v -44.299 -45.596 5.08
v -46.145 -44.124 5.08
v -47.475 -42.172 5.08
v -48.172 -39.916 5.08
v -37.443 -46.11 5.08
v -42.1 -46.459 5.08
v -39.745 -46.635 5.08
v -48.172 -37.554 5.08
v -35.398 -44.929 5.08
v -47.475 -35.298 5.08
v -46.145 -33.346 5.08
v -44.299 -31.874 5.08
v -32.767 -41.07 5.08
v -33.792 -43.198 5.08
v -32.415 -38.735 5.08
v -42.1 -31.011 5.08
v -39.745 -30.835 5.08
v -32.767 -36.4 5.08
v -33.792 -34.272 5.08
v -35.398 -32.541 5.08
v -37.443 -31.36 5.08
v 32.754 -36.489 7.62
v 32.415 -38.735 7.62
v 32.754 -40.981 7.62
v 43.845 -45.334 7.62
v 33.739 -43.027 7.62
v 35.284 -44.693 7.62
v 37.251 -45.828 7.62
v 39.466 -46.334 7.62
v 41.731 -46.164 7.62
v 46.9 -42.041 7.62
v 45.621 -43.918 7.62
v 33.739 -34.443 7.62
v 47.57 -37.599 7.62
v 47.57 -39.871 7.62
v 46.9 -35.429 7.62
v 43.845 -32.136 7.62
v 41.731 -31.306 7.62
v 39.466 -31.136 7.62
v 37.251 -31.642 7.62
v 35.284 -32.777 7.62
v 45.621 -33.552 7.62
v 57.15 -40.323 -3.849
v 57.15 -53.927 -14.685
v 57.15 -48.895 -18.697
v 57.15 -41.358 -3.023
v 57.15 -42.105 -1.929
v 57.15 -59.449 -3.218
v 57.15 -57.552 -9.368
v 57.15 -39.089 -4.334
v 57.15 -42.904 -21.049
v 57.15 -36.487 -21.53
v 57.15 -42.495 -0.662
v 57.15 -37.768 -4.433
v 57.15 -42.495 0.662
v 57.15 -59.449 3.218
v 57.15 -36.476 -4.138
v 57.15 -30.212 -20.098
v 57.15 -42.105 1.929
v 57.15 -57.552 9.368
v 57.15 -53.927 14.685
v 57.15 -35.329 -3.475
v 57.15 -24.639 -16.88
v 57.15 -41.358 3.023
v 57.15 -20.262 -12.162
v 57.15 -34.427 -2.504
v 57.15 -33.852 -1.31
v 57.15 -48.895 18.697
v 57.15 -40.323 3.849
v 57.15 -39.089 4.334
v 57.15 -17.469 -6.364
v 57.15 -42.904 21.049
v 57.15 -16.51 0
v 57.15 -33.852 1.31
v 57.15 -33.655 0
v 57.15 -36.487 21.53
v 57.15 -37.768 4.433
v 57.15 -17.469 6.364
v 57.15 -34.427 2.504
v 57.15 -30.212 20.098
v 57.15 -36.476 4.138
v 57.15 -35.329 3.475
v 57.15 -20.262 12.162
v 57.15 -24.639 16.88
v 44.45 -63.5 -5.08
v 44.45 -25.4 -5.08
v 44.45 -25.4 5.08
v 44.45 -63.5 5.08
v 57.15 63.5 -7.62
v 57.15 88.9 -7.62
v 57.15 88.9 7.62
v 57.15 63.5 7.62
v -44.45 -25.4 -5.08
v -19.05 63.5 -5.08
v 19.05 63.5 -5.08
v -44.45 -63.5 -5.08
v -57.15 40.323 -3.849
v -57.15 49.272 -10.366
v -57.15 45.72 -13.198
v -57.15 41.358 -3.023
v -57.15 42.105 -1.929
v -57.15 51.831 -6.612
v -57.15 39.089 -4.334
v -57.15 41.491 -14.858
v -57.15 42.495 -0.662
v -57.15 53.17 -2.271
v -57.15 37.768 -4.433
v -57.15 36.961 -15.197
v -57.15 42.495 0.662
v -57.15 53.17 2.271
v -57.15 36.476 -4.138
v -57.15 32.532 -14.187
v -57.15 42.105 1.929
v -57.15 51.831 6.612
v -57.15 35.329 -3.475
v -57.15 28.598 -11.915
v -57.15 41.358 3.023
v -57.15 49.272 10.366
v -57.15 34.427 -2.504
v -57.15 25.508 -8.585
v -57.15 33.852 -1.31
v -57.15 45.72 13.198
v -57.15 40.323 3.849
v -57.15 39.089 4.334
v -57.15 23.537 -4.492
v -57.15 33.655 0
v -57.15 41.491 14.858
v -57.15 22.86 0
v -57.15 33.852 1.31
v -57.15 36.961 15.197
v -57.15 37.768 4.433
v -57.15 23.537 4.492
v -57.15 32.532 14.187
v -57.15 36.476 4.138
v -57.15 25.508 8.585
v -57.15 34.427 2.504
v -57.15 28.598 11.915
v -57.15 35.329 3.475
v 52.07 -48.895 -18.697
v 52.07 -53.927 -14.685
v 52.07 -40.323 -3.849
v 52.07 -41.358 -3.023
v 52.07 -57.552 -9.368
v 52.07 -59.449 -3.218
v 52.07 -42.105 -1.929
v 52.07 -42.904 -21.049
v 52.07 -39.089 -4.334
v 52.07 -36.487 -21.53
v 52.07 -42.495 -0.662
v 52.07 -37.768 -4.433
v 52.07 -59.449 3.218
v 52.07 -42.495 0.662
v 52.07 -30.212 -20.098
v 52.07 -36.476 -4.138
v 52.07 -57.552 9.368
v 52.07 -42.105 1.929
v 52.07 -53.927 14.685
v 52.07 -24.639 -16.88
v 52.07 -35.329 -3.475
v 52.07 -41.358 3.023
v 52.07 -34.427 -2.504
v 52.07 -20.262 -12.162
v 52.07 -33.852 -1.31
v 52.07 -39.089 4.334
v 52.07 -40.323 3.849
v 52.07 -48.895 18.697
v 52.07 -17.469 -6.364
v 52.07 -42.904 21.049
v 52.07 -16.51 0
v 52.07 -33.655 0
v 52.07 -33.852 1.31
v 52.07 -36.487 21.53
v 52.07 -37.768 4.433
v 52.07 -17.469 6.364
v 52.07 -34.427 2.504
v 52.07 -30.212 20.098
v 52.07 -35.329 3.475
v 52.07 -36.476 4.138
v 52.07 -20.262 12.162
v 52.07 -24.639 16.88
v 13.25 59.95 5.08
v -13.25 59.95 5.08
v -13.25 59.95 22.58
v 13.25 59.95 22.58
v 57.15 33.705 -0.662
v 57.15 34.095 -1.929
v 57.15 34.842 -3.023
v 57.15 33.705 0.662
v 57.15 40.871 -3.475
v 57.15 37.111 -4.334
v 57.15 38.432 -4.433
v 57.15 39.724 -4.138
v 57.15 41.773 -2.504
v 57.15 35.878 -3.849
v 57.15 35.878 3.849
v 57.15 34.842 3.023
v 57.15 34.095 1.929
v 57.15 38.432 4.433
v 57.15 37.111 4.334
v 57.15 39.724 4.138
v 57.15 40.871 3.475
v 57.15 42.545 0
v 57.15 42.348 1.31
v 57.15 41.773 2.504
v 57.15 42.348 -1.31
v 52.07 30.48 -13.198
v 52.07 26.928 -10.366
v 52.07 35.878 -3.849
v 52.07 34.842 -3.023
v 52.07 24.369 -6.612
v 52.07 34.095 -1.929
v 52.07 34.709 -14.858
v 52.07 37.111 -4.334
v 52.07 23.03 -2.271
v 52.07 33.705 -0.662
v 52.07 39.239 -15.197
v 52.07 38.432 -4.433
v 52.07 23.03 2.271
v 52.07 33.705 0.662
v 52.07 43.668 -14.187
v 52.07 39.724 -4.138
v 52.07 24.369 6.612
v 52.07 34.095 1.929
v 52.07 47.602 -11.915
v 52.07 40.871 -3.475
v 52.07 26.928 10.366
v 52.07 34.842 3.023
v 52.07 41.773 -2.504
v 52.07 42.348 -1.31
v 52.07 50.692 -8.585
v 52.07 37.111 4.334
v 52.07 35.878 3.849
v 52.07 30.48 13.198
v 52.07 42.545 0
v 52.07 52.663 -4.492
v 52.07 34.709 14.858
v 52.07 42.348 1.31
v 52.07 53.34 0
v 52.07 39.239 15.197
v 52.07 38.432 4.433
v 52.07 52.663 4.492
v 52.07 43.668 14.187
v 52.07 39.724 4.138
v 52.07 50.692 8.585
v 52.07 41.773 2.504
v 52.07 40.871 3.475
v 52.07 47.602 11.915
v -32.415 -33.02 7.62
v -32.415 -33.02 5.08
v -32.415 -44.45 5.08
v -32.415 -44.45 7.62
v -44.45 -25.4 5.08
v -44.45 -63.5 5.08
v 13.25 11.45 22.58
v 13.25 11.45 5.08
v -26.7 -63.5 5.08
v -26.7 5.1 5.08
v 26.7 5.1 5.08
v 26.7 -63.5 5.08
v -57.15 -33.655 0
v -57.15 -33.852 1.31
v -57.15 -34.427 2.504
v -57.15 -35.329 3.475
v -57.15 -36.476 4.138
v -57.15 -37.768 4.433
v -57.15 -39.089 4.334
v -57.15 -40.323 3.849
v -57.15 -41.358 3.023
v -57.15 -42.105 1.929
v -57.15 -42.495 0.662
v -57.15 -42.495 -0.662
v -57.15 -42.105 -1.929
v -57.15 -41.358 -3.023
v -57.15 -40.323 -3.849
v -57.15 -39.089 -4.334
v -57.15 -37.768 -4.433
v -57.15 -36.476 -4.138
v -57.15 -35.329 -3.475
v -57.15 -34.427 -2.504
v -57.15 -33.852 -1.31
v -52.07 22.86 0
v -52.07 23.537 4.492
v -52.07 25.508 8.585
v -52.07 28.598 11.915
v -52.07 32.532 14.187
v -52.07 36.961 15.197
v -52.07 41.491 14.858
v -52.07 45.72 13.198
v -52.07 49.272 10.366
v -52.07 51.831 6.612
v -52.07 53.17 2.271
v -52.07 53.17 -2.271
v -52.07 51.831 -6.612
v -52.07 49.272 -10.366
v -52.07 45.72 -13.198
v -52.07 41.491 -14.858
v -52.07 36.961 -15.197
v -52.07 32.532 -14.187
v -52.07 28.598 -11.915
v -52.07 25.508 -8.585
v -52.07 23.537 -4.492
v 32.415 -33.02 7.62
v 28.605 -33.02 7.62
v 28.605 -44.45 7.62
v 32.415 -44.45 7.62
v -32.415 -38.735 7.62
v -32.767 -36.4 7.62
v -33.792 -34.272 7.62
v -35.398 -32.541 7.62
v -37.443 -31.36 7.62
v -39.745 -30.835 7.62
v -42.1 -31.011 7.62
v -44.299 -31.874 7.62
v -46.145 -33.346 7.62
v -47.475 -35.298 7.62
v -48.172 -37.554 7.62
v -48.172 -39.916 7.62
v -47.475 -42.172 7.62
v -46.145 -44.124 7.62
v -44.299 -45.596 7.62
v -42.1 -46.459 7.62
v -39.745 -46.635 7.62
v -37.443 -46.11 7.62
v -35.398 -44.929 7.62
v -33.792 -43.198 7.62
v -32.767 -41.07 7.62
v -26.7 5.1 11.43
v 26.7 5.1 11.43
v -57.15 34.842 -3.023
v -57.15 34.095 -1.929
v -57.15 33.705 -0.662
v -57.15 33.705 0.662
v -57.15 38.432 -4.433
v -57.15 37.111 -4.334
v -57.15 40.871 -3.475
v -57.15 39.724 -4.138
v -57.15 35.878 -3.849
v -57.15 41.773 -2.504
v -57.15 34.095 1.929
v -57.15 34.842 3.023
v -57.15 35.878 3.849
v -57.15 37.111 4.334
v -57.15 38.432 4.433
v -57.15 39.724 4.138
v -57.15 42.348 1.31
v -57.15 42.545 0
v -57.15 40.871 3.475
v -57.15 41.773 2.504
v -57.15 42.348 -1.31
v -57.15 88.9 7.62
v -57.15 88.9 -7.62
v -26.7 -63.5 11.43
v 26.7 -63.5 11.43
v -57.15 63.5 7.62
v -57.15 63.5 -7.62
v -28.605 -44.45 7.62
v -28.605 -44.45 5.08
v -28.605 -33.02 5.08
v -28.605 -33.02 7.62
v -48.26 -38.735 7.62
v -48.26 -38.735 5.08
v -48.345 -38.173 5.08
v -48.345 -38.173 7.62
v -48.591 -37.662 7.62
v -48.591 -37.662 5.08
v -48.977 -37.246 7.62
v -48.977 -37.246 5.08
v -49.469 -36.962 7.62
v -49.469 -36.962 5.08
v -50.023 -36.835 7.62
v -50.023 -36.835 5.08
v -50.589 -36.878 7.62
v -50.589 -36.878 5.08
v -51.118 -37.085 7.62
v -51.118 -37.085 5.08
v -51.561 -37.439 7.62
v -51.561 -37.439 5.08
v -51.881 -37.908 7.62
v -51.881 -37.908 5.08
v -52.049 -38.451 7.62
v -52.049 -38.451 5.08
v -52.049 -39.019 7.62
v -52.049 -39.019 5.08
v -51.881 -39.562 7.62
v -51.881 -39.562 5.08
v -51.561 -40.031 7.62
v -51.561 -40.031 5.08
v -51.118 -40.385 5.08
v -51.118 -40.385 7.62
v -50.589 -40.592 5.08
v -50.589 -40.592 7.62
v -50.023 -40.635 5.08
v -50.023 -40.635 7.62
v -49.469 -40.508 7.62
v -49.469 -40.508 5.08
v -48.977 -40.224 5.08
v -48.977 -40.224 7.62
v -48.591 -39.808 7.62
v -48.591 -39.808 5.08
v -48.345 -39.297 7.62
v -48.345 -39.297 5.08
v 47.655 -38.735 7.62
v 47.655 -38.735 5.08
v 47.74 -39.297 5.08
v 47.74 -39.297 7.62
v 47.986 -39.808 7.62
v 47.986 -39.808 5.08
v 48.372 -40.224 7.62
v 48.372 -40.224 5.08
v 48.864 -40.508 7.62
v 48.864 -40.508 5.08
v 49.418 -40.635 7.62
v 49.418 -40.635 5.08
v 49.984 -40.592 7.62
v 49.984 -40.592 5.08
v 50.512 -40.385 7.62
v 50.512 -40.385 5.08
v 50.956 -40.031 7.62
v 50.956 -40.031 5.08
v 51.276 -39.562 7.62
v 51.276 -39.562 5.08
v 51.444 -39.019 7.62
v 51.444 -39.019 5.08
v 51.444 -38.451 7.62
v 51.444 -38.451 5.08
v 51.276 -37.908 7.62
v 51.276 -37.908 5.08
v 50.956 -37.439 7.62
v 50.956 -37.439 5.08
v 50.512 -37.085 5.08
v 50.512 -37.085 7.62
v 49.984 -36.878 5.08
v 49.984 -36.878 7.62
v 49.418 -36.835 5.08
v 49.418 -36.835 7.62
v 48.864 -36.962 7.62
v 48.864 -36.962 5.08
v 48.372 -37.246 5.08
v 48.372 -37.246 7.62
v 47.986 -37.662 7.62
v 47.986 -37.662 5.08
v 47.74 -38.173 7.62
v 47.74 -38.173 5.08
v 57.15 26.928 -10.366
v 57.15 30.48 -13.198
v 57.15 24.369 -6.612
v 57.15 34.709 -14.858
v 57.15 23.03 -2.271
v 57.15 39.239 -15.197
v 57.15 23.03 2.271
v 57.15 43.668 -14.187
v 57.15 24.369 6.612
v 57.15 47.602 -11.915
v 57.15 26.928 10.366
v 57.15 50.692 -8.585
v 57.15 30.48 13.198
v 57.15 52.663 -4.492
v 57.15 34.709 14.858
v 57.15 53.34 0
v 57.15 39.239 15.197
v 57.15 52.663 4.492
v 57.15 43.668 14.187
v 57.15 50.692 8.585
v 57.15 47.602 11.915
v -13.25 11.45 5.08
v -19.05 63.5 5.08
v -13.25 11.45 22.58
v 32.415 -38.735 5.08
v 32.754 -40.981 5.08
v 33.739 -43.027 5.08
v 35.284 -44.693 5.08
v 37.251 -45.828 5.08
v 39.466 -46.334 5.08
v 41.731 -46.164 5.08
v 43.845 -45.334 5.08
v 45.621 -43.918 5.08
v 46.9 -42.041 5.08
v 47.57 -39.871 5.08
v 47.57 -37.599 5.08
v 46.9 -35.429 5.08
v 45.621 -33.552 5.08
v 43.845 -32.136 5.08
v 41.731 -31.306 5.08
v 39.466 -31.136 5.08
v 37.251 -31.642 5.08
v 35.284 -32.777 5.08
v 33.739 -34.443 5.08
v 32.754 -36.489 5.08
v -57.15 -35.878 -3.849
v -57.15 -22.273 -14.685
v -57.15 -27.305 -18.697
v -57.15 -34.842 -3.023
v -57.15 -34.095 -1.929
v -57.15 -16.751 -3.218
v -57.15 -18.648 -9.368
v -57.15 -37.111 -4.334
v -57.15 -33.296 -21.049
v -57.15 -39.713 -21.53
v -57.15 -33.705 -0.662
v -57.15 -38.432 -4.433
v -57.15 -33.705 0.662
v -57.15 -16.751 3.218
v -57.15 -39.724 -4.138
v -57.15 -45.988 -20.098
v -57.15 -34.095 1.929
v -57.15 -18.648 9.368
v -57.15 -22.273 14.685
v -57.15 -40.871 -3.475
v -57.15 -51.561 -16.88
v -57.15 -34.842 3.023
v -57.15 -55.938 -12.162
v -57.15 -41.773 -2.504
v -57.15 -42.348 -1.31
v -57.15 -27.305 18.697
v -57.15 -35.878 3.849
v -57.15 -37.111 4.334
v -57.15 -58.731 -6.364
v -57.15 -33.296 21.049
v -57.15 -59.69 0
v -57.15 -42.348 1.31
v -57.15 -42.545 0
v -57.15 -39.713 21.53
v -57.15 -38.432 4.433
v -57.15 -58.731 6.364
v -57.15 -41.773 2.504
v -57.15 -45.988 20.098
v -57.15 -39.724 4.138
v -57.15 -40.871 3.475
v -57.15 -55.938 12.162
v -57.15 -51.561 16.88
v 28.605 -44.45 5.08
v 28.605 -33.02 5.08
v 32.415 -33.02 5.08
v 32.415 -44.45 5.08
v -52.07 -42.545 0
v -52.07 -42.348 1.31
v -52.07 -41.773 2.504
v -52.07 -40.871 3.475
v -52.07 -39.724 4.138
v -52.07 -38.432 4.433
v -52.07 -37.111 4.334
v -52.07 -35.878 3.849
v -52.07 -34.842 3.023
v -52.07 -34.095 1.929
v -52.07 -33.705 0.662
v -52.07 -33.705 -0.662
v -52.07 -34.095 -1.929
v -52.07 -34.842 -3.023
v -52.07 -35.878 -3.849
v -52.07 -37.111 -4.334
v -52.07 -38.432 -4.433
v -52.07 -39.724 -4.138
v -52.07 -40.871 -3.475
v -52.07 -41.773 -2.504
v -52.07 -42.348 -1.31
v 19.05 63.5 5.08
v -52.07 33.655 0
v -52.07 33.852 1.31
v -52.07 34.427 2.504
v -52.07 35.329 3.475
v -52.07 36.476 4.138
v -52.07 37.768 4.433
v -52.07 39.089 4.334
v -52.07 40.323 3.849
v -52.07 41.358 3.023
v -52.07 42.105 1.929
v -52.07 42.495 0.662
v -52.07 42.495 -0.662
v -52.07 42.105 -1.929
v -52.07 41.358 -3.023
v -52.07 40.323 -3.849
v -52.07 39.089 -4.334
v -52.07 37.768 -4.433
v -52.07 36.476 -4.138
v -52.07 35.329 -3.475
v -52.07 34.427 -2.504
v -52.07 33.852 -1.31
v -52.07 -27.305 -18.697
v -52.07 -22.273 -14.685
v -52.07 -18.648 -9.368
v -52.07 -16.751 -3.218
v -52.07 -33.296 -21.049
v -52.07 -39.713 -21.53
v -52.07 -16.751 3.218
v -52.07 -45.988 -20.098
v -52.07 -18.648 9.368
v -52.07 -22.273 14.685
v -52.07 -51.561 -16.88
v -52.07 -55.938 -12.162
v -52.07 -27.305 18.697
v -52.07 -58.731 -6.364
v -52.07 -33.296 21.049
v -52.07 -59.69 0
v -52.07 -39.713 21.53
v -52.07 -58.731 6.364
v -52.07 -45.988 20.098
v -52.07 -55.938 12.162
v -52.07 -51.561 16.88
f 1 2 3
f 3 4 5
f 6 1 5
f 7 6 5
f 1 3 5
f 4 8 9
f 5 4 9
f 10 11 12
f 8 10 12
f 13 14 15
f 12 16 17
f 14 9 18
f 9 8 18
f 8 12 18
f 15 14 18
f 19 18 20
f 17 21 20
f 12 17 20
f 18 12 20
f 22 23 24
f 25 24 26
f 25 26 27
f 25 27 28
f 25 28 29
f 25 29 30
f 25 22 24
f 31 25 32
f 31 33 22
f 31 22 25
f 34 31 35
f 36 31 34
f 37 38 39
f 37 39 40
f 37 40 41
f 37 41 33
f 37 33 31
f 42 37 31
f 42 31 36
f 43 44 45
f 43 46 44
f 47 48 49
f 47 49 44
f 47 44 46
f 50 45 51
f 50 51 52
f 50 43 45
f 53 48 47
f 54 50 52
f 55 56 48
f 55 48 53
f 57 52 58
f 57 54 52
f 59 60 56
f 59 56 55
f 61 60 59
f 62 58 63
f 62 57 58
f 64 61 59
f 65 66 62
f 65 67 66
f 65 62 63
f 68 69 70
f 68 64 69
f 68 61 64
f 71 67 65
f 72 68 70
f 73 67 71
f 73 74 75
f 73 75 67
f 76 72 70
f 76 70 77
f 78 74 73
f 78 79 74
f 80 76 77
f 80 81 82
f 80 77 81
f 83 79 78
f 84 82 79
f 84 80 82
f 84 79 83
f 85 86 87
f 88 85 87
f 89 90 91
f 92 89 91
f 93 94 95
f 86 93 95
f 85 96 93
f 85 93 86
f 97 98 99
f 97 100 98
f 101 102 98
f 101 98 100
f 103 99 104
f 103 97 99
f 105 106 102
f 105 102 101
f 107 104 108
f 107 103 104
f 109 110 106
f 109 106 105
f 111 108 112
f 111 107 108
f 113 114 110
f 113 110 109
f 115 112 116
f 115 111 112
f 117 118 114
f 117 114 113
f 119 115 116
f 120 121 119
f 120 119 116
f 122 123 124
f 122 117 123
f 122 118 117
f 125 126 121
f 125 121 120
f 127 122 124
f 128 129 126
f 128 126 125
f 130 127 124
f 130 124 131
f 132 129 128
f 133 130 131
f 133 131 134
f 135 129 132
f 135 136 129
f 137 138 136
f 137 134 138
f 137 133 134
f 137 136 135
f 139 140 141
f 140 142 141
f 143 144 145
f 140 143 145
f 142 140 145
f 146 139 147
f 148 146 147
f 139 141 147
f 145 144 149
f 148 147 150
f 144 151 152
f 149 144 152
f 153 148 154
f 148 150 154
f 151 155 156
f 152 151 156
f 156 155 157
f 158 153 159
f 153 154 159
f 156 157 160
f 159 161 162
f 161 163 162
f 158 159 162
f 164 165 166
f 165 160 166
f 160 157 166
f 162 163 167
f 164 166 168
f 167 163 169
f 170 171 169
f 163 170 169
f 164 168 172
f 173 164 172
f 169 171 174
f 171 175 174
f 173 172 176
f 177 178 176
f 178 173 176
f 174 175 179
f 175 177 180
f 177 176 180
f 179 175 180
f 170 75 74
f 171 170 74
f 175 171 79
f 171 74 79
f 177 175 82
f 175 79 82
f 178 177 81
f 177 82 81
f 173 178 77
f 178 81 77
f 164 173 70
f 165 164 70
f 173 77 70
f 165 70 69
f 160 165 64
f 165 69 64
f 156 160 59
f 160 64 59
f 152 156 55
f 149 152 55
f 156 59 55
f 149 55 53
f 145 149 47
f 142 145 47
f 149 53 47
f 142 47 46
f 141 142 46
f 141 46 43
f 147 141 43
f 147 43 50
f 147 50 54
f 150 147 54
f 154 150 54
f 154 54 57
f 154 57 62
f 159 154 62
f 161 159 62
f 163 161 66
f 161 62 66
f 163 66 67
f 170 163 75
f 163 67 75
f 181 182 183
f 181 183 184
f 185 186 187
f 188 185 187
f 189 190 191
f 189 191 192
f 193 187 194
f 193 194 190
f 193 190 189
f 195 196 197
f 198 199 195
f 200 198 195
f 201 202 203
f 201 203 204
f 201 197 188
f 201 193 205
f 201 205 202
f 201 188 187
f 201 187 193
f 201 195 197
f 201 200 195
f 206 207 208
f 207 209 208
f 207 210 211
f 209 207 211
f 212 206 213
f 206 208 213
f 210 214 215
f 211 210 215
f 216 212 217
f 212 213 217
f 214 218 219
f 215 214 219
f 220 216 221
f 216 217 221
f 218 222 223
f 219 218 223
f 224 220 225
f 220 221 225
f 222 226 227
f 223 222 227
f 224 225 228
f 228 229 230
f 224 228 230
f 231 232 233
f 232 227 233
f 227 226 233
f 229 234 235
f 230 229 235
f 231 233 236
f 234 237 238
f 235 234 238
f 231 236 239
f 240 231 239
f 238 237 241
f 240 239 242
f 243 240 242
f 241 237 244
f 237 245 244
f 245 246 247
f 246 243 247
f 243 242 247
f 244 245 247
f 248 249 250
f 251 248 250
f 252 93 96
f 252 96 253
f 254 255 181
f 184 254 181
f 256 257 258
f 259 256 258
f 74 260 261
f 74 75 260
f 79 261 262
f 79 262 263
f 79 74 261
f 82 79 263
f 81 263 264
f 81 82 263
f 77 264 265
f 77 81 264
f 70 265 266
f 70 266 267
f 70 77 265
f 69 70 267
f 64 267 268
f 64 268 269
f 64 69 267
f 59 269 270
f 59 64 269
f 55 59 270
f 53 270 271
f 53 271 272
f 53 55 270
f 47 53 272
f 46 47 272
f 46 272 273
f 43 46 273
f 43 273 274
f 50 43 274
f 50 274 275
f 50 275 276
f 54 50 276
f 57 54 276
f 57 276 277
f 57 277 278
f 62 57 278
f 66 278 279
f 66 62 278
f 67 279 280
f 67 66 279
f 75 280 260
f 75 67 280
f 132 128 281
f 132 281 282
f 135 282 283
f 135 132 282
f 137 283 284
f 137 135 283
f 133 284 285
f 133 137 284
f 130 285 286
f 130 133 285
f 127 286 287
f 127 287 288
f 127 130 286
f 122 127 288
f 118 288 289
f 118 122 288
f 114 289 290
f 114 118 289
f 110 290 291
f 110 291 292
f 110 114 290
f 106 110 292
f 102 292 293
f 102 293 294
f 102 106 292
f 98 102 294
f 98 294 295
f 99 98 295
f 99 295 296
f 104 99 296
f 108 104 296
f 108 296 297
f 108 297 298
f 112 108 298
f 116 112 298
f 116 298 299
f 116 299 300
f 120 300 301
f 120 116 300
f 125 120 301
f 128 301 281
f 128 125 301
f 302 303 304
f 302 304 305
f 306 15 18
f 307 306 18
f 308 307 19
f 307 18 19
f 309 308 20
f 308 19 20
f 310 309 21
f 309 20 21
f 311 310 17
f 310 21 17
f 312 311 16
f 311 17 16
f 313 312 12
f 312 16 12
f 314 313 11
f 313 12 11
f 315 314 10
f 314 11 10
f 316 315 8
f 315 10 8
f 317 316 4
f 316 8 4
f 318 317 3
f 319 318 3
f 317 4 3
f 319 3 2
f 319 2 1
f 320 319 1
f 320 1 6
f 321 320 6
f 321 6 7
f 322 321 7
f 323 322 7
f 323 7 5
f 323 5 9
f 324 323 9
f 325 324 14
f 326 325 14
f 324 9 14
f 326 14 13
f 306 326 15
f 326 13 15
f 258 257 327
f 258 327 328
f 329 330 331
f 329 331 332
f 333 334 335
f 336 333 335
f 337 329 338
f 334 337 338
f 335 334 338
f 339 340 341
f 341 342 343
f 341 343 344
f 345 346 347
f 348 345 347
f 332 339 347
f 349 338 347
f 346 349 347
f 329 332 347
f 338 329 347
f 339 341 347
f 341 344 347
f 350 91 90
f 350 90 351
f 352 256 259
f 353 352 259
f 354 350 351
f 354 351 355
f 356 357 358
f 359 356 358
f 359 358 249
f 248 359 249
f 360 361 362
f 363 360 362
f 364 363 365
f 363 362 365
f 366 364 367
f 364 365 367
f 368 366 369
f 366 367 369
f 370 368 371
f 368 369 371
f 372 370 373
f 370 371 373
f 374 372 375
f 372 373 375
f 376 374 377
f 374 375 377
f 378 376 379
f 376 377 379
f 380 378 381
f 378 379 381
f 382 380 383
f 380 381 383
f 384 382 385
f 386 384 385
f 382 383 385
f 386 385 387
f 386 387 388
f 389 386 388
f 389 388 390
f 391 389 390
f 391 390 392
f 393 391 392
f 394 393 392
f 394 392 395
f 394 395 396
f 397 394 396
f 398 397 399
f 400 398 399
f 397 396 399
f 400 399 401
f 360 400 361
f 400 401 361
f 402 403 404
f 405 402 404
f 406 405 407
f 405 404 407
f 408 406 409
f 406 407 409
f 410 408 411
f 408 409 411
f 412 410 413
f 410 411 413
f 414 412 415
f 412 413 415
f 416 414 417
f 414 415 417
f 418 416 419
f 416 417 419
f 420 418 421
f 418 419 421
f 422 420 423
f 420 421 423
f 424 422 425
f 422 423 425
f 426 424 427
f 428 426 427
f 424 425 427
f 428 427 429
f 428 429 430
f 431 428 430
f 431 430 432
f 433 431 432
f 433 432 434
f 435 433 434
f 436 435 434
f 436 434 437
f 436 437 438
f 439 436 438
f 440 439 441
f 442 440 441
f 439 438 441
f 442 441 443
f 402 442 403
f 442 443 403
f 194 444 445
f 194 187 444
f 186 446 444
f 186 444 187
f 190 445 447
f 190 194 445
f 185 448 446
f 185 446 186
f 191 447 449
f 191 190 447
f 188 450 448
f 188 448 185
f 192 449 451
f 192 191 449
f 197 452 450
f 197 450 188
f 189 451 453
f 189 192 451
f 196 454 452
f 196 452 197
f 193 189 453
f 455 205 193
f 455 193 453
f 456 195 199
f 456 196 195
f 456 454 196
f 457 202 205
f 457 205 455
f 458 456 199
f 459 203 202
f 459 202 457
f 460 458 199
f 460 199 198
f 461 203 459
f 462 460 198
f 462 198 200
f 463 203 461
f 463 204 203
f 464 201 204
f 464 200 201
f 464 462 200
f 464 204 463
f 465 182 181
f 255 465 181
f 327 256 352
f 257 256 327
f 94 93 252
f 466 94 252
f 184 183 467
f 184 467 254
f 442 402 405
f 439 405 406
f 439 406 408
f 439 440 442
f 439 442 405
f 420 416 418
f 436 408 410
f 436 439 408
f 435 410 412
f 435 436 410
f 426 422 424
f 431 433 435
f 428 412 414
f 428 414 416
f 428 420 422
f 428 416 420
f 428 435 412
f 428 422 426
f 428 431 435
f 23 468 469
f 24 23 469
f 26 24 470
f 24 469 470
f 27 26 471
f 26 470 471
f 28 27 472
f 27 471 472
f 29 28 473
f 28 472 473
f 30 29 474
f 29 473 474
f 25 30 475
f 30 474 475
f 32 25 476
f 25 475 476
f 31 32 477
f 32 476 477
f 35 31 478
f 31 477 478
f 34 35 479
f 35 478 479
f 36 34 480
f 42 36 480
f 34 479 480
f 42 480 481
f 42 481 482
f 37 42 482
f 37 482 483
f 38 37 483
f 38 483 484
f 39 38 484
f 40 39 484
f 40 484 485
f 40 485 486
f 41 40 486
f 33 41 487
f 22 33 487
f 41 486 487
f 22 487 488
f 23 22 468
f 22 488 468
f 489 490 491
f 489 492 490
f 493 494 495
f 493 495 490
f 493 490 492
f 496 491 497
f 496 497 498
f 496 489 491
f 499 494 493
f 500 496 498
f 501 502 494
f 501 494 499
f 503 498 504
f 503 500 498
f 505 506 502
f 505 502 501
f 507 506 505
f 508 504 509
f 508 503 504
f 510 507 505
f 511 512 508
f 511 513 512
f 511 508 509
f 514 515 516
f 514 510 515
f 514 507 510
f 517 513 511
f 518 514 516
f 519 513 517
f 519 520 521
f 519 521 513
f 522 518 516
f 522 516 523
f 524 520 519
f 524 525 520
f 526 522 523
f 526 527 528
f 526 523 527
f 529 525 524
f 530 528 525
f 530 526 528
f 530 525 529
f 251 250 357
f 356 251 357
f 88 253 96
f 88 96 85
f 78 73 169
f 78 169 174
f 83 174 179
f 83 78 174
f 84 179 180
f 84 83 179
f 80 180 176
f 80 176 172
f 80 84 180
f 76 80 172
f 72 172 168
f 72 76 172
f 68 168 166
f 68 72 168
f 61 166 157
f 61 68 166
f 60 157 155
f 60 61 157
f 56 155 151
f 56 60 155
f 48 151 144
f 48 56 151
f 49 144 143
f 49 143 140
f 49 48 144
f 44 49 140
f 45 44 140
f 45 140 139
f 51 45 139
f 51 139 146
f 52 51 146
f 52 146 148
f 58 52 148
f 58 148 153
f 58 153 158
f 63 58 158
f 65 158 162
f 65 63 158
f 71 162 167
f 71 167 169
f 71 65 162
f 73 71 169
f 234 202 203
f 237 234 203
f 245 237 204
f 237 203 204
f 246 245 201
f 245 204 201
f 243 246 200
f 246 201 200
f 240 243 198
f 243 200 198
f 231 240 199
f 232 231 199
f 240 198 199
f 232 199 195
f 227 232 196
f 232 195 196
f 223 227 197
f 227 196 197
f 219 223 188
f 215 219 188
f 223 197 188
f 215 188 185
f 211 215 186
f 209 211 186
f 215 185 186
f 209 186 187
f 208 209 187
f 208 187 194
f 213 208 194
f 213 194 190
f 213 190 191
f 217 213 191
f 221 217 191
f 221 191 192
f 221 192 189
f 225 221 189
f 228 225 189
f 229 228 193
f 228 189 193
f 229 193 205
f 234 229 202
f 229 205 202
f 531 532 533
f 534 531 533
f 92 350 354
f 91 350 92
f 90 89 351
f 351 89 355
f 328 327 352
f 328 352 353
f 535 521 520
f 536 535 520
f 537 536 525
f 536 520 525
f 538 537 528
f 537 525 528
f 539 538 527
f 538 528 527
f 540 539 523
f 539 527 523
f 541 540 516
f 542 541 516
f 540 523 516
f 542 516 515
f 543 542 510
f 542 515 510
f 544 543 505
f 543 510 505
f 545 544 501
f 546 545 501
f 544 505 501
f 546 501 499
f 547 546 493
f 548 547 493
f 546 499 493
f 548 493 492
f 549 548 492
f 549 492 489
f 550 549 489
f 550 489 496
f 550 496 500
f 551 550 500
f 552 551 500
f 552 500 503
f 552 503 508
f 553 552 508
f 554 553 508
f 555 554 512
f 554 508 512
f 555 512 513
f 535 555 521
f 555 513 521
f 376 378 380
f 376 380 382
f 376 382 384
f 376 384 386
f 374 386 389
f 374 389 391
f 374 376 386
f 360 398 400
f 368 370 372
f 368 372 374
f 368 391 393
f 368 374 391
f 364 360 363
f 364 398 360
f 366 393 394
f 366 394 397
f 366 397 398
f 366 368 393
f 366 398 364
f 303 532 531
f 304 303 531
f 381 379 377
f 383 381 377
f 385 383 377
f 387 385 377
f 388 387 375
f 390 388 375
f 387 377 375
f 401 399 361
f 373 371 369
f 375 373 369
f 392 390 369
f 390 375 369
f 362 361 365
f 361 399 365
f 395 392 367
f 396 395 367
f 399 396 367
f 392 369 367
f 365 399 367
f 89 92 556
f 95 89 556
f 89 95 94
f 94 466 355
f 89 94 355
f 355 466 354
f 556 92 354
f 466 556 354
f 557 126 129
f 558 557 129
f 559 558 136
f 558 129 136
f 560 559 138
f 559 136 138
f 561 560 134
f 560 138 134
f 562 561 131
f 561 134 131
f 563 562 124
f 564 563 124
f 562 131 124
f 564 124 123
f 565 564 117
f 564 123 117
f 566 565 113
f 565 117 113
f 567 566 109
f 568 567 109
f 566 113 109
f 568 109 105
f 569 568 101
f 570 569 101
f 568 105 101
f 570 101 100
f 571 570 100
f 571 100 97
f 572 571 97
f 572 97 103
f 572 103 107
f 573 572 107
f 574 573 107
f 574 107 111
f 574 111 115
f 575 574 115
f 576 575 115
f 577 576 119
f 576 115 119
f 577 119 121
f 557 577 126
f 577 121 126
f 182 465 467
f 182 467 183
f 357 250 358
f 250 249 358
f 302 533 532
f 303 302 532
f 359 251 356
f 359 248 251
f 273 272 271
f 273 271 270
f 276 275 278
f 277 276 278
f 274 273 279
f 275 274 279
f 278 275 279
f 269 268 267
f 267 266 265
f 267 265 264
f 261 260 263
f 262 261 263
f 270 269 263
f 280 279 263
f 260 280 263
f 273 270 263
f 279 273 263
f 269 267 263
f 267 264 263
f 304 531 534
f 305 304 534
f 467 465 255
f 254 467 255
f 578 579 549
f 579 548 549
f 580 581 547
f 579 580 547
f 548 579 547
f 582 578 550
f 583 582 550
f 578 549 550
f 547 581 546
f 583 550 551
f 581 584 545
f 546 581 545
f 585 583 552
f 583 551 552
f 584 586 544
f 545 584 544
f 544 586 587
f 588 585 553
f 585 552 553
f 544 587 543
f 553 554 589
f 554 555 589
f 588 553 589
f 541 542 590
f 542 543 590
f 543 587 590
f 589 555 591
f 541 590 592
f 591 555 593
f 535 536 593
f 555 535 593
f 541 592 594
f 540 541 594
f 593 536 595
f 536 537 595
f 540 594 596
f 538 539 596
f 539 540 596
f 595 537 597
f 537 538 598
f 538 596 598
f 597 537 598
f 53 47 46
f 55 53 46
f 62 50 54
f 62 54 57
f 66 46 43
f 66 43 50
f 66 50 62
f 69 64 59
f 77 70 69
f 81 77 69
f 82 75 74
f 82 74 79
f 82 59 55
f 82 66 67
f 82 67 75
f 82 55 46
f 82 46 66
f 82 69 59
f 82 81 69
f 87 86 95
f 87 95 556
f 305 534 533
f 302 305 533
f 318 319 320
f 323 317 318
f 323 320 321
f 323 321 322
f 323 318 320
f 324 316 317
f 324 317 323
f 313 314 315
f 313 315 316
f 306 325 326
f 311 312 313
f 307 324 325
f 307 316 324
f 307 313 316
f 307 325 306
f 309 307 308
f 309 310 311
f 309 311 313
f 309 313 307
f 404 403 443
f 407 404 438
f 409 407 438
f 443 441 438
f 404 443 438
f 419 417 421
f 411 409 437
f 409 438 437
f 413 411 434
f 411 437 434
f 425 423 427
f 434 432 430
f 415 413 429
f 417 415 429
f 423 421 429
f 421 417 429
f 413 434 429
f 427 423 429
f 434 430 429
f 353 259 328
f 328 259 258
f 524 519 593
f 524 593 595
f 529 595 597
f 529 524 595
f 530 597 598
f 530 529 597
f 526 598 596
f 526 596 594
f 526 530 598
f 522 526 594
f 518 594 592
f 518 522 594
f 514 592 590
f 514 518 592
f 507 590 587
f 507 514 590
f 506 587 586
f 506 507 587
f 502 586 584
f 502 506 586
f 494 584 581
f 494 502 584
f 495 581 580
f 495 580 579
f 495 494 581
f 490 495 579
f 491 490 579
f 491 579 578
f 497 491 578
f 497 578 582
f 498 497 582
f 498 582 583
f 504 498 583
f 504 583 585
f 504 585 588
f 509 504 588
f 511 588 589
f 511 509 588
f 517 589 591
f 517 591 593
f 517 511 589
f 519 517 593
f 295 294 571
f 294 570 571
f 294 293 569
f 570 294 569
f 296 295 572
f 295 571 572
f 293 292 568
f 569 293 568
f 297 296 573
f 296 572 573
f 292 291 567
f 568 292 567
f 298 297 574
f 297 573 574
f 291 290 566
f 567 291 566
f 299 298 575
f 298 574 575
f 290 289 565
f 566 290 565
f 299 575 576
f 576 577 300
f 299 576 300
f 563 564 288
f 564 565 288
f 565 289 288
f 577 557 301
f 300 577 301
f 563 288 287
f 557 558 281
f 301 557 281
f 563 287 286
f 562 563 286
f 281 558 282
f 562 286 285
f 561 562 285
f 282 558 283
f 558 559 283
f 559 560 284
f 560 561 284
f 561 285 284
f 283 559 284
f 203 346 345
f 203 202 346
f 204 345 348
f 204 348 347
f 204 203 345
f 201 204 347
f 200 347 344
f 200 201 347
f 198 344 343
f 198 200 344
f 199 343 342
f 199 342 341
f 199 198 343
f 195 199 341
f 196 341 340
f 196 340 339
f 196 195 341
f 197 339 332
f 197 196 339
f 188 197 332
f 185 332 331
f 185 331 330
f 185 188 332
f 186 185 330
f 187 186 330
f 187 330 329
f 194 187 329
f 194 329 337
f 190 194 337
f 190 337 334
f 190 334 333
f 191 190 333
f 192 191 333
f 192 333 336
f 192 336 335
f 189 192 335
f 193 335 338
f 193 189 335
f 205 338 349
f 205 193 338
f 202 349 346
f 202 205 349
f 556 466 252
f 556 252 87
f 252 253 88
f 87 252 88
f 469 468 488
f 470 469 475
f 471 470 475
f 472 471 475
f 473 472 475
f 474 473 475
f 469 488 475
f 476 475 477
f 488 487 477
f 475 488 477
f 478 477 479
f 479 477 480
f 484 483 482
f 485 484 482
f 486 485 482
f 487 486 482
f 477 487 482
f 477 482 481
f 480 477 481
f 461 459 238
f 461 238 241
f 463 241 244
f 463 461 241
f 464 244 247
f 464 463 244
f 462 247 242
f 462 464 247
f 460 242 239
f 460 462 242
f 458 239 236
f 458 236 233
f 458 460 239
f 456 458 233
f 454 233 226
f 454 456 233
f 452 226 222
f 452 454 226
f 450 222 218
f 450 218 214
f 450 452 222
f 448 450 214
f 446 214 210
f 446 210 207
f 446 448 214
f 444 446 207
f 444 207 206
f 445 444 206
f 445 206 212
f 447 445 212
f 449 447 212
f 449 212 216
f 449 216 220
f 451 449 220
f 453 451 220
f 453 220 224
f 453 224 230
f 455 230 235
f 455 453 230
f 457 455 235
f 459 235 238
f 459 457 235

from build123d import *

# Parameters (mm, degrees)
F0_W      = 88.9
F0_H      = 10.16
F1_DEPTH  = 63.5
F2_W      = 53.4
F2_H      = 68.6
F3_DEPTH  = 6.35
F4_R      = 4.445
F5_DEPTH  = 57.15
F6_R      = 21.59
F6_R_2    = 4.445
F7_DEPTH  = 5.08
F6_R_3    = 15.24
F8_R      = 15.24
F8_R_2    = 4.445
F9_DEPTH  = 5.08
F8_R_3    = 21.59
F11_DEPTH = 2.54
F10_R     = 1.905
F2_W_2    = 26.5
F2_H_2    = 48.5
F12_DEPTH = 17.5
F13_SIZE2 = 88.9
F13_SIZE  = 25.4
F14_W     = 114.3
F14_H     = 15.24
F15_DEPTH = 25.4
F17_DEPTH = 15.24


with BuildPart() as f1:
    # F0 (on Front) → F1 (new body, symmetric)
    with BuildSketch(Plane.XZ):
        Rectangle(F0_W, F0_H)
    extrude(amount=F1_DEPTH, both=True)

    # F13
    f13_edges = [f1.edges().sort_by_distance(p)[0] for p in [
        (44.45, 63.5, 0),
        (-44.45, 63.5, 0),
    ]]
    f13_side = f1.faces().sort_by_distance((0, 63.5, 0))[0]
    chamfer(f13_edges, length=F13_SIZE, length2=F13_SIZE2, reference=f13_side)

    # F14 (on face) → F15 (join)
    with BuildSketch(Plane(origin=(0, 63.5, 0), x_dir=(-1, 0, 0), z_dir=(0, 1, 0))):
        Rectangle(F14_W, F14_H)
    extrude(amount=F15_DEPTH)

    # F16 (on face) → F17 (join)
    with BuildSketch(Plane.XY.offset(7.62)):
        Polygon((-57.15, 74.93), (-16.51, 63.5), (-7.366, 63.5), (-57.15, 77.47), align=None)
        Polygon((57.15, 77.47), (7.366, 63.5), (16.51, 63.5), (57.15, 74.93), align=None)
    extrude(amount=-F17_DEPTH)


with BuildPart() as f3:
    # F2 (on face) → F3 (new body)
    with BuildSketch(Plane.XY.offset(5.08)):
        with Locations((0, -29.2)):
            Rectangle(F2_W, F2_H)
    extrude(amount=F3_DEPTH)


with BuildPart() as f5:
    # F4 (on Right) → F5 (new body, symmetric)
    with BuildSketch(Plane.YZ):
        with Locations((-38.1, 0)):
            Circle(F4_R)
    extrude(amount=F5_DEPTH, both=True)


with BuildPart() as f5b:
    # F4 (on Right) → F5, piece 2 (new body, symmetric)
    with BuildSketch(Plane.YZ):
        with Locations((38.1, 0)):
            Circle(F4_R)
    extrude(amount=F5_DEPTH, both=True)


with BuildPart() as f7:
    # F6 (on face) → F7 (new body)
    with BuildSketch(Plane.YZ.offset(57.15)):
        with Locations((-38.1, 0)):
            Circle(F6_R)
        with Locations((-38.1, 0)):
            Circle(F6_R_2, mode=Mode.SUBTRACT)
    extrude(amount=-F7_DEPTH)


with BuildPart() as f7b:
    # F6 (on face) → F7, piece 2 (new body)
    with BuildSketch(Plane.YZ.offset(57.15)):
        with Locations((38.1, 0)):
            Circle(F6_R_3)
        with Locations((38.1, 0)):
            Circle(F6_R_2, mode=Mode.SUBTRACT)
    extrude(amount=-F7_DEPTH)


with BuildPart() as f9:
    # F8 (on face) → F9 (new body)
    with BuildSketch(Plane(origin=(-57.15, 0, 0), x_dir=(0, -1, 0), z_dir=(-1, 0, 0))):
        with Locations((-38.1, 0)):
            Circle(F8_R)
        with Locations((-38.1, 0)):
            Circle(F8_R_2, mode=Mode.SUBTRACT)
    extrude(amount=-F9_DEPTH)


with BuildPart() as f9b:
    # F8 (on face) → F9, piece 2 (new body)
    with BuildSketch(Plane(origin=(-57.15, 0, 0), x_dir=(0, -1, 0), z_dir=(-1, 0, 0))):
        with Locations((38.1, 0)):
            Circle(F8_R_3)
        with Locations((38.1, 0)):
            Circle(F8_R_2, mode=Mode.SUBTRACT)
    extrude(amount=-F9_DEPTH)


with BuildPart() as f11:
    # F10 (on face) → F11 (new body)
    with BuildSketch(Plane.XY.offset(5.08)):
        Polygon((28.605, -33.02), (28.605, -44.45), (32.415, -44.45), (32.415, -38.735), (32.415, -33.02), align=None)
    extrude(amount=F11_DEPTH)


with BuildPart() as f11b:
    # F10 (on face) → F11, piece 2 (new body)
    with BuildSketch(Plane.XY.offset(5.08)):
        with BuildLine():
            ThreePointArc((51.465, -38.735), (49.56, -36.83), (47.655, -38.735))
            ThreePointArc((47.655, -38.735), (49.56, -40.64), (51.465, -38.735))
        make_face()
    extrude(amount=F11_DEPTH)


with BuildPart() as f11c:
    # F10 (on face) → F11, piece 3 (new body)
    with BuildSketch(Plane.XY.offset(5.08)):
        with BuildLine():
            ThreePointArc((47.655, -38.735), (40.035, -31.115), (32.415, -38.735))
            ThreePointArc((32.415, -38.735), (40.035, -46.355), (47.655, -38.735))
        make_face()
    extrude(amount=F11_DEPTH)


with BuildPart() as f11d:
    # F10 (on face) → F11, piece 4 (new body)
    with BuildSketch(Plane.XY.offset(5.08)):
        with Locations((-50.165, -38.735)):
            Circle(F10_R)
    extrude(amount=F11_DEPTH)


with BuildPart() as f11e:
    # F10 (on face) → F11, piece 5 (new body)
    with BuildSketch(Plane.XY.offset(5.08)):
        with BuildLine():
            ThreePointArc((-48.26, -38.735), (-40.3375, -46.6575), (-32.415, -38.735))
            ThreePointArc((-32.415, -38.735), (-40.3375, -30.8125), (-48.26, -38.735))
        make_face()
    extrude(amount=F11_DEPTH)


with BuildPart() as f11f:
    # F10 (on face) → F11, piece 6 (new body)
    with BuildSketch(Plane.XY.offset(5.08)):
        Polygon((-32.415, -44.45), (-28.605, -44.45), (-28.605, -33.02), (-32.415, -33.02), (-32.415, -38.735), align=None)
    extrude(amount=F11_DEPTH)


with BuildPart() as f12:
    # F2 (on face) → F12 (new body)
    with BuildSketch(Plane.XY.offset(5.08)):
        with Locations((0, 35.7)):
            Rectangle(F2_W_2, F2_H_2)
    extrude(amount=F12_DEPTH)


solid = Compound([f1.part, f3.part, f5.part, f5b.part, f7.part, f7b.part, f9.part, f9b.part, f11.part, f11b.part, f11c.part, f11d.part, f11e.part, f11f.part, f12.part])
